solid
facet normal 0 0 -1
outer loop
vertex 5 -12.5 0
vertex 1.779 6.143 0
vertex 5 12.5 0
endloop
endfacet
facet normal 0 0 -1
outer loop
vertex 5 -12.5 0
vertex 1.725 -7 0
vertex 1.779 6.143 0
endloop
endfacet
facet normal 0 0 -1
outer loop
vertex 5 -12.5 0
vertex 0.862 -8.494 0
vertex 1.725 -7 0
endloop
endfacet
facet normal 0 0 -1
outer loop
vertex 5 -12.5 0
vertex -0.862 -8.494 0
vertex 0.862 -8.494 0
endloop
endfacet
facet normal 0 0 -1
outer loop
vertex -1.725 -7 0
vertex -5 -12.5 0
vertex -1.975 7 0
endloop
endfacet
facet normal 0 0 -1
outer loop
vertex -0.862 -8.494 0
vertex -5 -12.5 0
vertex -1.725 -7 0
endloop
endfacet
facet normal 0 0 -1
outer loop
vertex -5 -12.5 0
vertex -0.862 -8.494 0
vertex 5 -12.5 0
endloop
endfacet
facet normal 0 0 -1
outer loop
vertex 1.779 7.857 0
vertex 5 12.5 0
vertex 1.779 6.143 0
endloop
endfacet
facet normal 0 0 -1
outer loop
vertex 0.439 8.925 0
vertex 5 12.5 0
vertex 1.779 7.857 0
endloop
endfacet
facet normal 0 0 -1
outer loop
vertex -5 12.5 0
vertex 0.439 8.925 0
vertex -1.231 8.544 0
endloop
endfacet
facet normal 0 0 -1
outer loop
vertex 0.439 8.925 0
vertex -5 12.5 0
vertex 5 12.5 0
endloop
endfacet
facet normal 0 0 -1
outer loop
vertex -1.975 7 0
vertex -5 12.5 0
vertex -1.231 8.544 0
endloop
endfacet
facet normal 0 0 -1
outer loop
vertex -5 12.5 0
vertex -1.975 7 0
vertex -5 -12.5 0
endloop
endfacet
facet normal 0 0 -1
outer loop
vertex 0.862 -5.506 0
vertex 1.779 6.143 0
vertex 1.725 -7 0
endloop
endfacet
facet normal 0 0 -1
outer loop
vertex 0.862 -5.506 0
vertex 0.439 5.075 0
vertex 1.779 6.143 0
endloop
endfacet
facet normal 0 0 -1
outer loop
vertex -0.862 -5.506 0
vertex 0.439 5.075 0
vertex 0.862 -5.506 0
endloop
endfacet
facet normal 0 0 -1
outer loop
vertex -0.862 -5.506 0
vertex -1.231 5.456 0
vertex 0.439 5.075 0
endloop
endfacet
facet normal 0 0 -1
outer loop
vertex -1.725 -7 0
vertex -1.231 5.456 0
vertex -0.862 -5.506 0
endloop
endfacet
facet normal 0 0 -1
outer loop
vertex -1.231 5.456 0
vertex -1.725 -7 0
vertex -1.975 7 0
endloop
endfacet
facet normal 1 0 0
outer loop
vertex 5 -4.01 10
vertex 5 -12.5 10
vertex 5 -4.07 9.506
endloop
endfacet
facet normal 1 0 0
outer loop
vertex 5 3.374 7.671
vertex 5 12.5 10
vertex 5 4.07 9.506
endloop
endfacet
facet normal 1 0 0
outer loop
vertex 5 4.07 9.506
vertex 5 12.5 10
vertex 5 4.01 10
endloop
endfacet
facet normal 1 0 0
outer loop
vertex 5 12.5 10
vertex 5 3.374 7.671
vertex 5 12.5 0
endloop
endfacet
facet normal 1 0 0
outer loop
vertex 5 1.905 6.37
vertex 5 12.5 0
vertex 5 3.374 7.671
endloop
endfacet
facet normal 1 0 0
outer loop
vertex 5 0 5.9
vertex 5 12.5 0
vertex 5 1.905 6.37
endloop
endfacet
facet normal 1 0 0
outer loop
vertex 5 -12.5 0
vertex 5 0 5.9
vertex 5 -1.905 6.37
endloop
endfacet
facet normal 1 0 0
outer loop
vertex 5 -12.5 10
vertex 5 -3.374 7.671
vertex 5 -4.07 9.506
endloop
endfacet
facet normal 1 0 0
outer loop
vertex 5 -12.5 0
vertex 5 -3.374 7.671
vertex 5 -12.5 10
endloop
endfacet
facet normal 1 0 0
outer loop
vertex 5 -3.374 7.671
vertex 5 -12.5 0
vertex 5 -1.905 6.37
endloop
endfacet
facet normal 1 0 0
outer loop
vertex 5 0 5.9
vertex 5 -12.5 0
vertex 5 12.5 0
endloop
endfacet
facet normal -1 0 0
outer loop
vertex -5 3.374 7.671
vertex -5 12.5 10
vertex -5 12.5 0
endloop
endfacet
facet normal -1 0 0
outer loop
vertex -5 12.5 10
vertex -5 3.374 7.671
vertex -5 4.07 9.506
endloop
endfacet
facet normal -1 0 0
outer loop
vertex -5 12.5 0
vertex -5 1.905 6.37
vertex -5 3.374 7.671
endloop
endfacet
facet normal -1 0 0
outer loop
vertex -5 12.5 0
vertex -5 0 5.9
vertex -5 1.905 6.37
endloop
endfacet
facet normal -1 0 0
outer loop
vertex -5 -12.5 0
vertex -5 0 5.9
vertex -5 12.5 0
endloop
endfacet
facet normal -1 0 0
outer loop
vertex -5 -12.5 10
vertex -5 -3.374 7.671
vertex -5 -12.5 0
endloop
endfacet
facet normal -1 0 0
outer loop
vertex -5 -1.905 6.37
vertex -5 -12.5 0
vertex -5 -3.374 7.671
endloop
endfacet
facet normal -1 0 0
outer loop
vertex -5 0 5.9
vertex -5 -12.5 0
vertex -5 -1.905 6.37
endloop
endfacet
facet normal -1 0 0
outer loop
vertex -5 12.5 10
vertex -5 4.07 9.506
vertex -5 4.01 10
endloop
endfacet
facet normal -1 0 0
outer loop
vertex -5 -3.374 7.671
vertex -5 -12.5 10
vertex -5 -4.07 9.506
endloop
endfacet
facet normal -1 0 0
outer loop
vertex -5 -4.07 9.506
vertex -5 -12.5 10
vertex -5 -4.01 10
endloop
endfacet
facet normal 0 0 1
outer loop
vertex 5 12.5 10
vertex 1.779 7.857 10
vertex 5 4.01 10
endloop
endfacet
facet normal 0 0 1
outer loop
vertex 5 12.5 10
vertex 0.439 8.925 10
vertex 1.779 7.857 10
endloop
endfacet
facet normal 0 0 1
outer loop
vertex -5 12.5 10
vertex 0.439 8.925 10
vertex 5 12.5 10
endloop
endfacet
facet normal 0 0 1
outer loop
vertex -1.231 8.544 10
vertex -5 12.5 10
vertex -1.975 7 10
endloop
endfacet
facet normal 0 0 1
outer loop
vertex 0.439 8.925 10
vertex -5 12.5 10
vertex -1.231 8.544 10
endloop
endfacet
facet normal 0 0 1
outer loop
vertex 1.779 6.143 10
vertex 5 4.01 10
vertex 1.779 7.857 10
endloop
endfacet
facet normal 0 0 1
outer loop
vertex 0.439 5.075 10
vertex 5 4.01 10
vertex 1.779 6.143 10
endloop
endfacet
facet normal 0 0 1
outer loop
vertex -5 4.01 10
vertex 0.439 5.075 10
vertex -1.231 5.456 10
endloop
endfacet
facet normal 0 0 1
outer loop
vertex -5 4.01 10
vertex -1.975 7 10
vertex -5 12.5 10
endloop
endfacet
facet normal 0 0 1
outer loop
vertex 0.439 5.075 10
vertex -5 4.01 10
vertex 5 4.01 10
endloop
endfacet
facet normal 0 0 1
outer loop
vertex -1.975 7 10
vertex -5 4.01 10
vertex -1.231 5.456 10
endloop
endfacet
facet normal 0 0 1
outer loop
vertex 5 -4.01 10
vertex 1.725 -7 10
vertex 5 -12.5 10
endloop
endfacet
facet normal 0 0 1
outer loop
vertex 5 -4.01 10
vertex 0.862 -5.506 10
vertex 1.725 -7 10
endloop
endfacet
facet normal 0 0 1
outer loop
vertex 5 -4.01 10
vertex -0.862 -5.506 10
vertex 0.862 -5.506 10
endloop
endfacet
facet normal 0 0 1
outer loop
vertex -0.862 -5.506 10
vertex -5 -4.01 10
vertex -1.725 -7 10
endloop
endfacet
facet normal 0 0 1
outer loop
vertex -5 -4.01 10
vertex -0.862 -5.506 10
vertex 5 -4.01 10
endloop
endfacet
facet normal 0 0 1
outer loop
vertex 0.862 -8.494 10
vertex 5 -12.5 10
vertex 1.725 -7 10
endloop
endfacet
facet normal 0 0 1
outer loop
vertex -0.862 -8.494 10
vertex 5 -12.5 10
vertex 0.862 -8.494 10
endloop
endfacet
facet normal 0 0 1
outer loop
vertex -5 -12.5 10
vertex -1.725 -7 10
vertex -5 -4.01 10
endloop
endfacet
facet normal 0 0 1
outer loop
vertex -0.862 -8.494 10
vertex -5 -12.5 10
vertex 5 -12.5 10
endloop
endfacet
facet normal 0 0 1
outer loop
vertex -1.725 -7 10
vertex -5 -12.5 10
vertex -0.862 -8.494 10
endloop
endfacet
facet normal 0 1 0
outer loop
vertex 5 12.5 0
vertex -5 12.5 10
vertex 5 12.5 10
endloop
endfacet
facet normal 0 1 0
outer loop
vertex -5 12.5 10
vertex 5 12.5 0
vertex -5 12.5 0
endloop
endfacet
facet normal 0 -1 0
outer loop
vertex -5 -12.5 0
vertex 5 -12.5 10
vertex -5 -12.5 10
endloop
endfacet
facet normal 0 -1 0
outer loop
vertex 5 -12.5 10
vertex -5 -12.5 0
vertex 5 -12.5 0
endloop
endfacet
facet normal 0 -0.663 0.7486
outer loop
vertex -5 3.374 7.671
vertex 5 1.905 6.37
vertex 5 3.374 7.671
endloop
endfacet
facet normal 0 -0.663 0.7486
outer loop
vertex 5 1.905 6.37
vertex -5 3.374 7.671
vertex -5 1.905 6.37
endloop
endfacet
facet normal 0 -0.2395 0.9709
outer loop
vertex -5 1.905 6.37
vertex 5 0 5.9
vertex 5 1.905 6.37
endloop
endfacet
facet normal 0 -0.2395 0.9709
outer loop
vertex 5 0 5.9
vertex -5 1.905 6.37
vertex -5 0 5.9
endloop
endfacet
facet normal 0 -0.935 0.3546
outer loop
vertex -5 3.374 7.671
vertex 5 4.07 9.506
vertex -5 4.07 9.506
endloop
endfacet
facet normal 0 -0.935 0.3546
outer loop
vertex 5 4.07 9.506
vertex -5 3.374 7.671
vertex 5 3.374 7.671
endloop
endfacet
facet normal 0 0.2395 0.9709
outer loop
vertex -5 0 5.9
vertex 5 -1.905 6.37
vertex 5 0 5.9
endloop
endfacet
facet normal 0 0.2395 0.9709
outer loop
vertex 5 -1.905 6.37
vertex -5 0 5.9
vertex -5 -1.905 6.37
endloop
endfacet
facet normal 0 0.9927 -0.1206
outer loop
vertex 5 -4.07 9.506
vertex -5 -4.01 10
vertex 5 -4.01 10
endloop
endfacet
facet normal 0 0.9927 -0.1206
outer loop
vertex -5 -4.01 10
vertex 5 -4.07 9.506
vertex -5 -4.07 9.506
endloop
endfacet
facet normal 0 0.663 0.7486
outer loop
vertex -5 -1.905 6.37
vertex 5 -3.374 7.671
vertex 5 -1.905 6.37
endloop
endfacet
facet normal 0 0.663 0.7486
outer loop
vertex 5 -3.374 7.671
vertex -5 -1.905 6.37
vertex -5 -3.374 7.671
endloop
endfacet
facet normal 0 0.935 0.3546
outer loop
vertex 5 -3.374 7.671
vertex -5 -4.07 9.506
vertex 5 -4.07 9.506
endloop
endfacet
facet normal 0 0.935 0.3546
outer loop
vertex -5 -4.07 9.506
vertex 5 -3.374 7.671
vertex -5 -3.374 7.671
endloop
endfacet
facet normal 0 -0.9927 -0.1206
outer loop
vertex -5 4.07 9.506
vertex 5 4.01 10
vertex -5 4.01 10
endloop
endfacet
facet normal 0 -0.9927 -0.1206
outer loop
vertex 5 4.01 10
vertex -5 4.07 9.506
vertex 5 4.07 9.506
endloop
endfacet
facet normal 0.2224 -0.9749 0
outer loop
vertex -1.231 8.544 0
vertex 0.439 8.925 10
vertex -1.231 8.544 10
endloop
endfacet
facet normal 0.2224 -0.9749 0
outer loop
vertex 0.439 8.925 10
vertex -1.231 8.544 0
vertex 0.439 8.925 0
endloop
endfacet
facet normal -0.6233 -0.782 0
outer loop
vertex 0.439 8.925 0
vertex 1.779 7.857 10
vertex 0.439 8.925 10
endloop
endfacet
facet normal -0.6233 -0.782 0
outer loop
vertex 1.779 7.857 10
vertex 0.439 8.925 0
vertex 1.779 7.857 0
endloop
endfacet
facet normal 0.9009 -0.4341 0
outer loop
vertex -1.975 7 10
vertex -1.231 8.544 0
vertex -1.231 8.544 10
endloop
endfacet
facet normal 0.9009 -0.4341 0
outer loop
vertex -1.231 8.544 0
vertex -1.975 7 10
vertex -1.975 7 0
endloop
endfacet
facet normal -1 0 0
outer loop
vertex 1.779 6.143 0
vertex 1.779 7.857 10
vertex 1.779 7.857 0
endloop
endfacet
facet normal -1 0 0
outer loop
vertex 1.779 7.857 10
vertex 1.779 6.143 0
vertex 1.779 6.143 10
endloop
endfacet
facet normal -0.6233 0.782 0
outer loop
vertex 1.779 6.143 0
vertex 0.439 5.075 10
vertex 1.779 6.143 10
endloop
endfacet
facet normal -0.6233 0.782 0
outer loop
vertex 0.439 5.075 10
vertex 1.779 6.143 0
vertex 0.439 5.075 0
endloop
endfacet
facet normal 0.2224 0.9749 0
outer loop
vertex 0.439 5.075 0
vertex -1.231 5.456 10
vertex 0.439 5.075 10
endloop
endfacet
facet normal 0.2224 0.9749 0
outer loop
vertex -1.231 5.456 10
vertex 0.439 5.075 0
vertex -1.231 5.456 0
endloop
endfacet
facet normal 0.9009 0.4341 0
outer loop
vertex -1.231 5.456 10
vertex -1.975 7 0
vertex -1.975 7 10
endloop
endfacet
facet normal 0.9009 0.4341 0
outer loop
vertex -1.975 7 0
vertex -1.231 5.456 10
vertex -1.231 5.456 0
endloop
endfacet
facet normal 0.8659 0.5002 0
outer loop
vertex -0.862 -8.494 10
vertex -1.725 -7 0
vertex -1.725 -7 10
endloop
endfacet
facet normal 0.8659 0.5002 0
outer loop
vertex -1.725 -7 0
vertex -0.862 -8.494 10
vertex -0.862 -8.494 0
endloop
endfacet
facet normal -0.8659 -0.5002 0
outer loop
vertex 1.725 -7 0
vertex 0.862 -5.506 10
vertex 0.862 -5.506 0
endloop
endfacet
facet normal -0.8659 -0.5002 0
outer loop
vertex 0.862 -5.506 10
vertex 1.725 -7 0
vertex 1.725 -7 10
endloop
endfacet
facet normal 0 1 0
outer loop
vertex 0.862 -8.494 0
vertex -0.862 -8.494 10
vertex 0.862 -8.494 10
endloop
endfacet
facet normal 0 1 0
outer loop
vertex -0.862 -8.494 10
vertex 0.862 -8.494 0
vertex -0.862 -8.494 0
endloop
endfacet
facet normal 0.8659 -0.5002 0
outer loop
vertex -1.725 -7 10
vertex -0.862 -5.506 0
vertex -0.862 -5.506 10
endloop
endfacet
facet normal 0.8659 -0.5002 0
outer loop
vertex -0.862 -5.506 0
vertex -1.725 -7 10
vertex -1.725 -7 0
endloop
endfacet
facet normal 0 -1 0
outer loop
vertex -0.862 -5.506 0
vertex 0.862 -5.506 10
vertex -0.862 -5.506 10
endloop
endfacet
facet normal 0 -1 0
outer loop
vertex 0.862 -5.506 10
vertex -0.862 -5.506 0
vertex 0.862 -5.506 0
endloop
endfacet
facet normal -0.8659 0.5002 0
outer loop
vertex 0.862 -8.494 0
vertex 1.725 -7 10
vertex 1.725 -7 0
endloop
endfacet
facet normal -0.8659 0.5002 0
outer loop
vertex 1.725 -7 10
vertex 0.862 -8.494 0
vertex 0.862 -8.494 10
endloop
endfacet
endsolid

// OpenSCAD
// file: functions.scad
// PRUSA Mendel  
// Functions used in many files
// GNU GPL v3
// Josef Průša
// josefprusa@me.com
// prusadjs.cz
// http://www.reprap.org/wiki/Prusa_Mendel
// http://github.com/prusajr/PrusaMendel


module nut(d,h,horizontal=true){
cornerdiameter =  (d / 2) / cos (180 / 6);
cylinder(h = h, r = cornerdiameter, $fn = 6);
if(horizontal){
for(i = [1:6]){
	rotate([0,0,60*i]) translate([-cornerdiameter-0.2,0,0]) rotate([0,0,-45]) cube(size = [2,2,h]);
}}
}

// Based on nophead research
module polyhole(d,h) {
    n = max(round(2 * d),3);
    rotate([0,0,180])
        cylinder(h = h, r = (d / 2) / cos (180 / n), $fn = n);
}




module roundcorner(diameter){
	difference(){
		cube(size = [diameter,diameter,99], center = false);
		translate(v = [diameter, diameter, 0]) cylinder(h = 100, r=diameter, center=true);
	}
}
// file: metric.scad
// PRUSA Mendel  
// Default metric sizes
// GNU GPL v3
// Josef Průša
// josefprusa@me.com
// prusadjs.cz
// http://www.reprap.org/wiki/Prusa_Mendel
// http://github.com/prusajr/PrusaMendel

// DONT CHANGE THIS FILE! ALTER VALUES IN CONFIGURATION.SCAD INSTEAD

// RODS

threaded_rod_diameter = 8.7;
threaded_rod_diameter_horizontal = 8.7;
smooth_bar_diameter = 8;
smooth_bar_diameter_horizontal = 8.5;

// Nuts and bolts

m8_diameter = 9;
m8_nut_diameter = 14.1;

m4_diameter = 4.5;
m4_nut_diameter = 9;

m3_diameter = 3.6;
m3_nut_diameter = 5.3;
m3_nut_diameter_horizontal = 6.1;

// Bushing holder

bushing_core_diameter = smooth_bar_diameter;
bushing_material_thickness = 1;

// Motors

motor_shaft = 5.5;
// file: configuration.scad
// PRUSA Mendel  
// Configuration file
// GNU GPL v3
// Josef Průša
// josefprusa@me.com
// prusadjs.cz
// http://www.reprap.org/wiki/Prusa_Mendel
// http://github.com/prusajr/PrusaMendel

// PLEASE SELECT ONE OF THE CONFIGURATIONS BELOW
// BY UN-COMMENTING IT

// Uncomment for metric settings
// METRIC METRIC METRIC METRIC METRIC METRIC METRIC METRIC 

include <metric.scad>;

// CUSTOM CUSTOM CUSTOM CUSTOM CUSTOM CUSTOM CUSTOM CUSTOM CUSTOM

thin_wall = 3;


// Linear bearing version
linear = true;
// set false for LM-8UU, true for LM-E-8UU (ignore if linear is set to false)
lme8uu = false;



// CHANGE ONLY THE STUFF YOU KNOW
// IT WILL REPLACE DEFAULT SETTING

// RODS
threaded_rod_diameter = 9.1;
threaded_rod_diameter_horizontal = 0;
// smooth_bar_diameter = 0;
// smooth_bar_diameter_horizontal = 0;

// Nuts and bolts

m8_diameter = 8.125;
m8_nut_diameter = 13;

m4_diameter = 4.5;
m4_nut_diameter = 8.1;

m3_diameter = 3.45;
m3_nut_diameter = 6.34;

motor_shaft = 5.65;

// Bushing holder

// bushing_core_diameter = smooth_bar_diameter;
// bushing_material_thickness = 0;


///counted stuff
m3_nut_diameter_bigger = ((m3_nut_diameter  / 2) / cos (180 / 6))*2;
//m3_nut_diameter = m3_nut_diameter_bigger;
// functions 
include <functions.scad>
// main file
// PRUSA Mendel  
// Rod clamp
// GNU GPL v3
// Josef Průša
// josefprusa@me.com
// prusadjs.cz
// http://www.reprap.org/wiki/Prusa_Mendel
// http://github.com/prusajr/PrusaMendel


include <configuration.scad>

/**
 * @id rod-clamp
 * @name Rod clamp
 * @category Printed
 */

module rodclamp(){ 
translate([-5,0,5]) rotate([0,-270,0]) translate([0,0,5]) difference(){
cube([10,25,10],center=true);
translate([-5,0,0]) cylinder(r=4.1,h=20,center=true);
translate([0,7,0]) rotate([0,90,0]) cylinder(r=m3_diameter/2+.25,h=20,center=true);translate([0,-7,0]) rotate([0,90,0]) cylinder(r=m3_diameter/2,h=20,center=true);}
}

 rodclamp();
//cube([100,100,0.01],center=true);
